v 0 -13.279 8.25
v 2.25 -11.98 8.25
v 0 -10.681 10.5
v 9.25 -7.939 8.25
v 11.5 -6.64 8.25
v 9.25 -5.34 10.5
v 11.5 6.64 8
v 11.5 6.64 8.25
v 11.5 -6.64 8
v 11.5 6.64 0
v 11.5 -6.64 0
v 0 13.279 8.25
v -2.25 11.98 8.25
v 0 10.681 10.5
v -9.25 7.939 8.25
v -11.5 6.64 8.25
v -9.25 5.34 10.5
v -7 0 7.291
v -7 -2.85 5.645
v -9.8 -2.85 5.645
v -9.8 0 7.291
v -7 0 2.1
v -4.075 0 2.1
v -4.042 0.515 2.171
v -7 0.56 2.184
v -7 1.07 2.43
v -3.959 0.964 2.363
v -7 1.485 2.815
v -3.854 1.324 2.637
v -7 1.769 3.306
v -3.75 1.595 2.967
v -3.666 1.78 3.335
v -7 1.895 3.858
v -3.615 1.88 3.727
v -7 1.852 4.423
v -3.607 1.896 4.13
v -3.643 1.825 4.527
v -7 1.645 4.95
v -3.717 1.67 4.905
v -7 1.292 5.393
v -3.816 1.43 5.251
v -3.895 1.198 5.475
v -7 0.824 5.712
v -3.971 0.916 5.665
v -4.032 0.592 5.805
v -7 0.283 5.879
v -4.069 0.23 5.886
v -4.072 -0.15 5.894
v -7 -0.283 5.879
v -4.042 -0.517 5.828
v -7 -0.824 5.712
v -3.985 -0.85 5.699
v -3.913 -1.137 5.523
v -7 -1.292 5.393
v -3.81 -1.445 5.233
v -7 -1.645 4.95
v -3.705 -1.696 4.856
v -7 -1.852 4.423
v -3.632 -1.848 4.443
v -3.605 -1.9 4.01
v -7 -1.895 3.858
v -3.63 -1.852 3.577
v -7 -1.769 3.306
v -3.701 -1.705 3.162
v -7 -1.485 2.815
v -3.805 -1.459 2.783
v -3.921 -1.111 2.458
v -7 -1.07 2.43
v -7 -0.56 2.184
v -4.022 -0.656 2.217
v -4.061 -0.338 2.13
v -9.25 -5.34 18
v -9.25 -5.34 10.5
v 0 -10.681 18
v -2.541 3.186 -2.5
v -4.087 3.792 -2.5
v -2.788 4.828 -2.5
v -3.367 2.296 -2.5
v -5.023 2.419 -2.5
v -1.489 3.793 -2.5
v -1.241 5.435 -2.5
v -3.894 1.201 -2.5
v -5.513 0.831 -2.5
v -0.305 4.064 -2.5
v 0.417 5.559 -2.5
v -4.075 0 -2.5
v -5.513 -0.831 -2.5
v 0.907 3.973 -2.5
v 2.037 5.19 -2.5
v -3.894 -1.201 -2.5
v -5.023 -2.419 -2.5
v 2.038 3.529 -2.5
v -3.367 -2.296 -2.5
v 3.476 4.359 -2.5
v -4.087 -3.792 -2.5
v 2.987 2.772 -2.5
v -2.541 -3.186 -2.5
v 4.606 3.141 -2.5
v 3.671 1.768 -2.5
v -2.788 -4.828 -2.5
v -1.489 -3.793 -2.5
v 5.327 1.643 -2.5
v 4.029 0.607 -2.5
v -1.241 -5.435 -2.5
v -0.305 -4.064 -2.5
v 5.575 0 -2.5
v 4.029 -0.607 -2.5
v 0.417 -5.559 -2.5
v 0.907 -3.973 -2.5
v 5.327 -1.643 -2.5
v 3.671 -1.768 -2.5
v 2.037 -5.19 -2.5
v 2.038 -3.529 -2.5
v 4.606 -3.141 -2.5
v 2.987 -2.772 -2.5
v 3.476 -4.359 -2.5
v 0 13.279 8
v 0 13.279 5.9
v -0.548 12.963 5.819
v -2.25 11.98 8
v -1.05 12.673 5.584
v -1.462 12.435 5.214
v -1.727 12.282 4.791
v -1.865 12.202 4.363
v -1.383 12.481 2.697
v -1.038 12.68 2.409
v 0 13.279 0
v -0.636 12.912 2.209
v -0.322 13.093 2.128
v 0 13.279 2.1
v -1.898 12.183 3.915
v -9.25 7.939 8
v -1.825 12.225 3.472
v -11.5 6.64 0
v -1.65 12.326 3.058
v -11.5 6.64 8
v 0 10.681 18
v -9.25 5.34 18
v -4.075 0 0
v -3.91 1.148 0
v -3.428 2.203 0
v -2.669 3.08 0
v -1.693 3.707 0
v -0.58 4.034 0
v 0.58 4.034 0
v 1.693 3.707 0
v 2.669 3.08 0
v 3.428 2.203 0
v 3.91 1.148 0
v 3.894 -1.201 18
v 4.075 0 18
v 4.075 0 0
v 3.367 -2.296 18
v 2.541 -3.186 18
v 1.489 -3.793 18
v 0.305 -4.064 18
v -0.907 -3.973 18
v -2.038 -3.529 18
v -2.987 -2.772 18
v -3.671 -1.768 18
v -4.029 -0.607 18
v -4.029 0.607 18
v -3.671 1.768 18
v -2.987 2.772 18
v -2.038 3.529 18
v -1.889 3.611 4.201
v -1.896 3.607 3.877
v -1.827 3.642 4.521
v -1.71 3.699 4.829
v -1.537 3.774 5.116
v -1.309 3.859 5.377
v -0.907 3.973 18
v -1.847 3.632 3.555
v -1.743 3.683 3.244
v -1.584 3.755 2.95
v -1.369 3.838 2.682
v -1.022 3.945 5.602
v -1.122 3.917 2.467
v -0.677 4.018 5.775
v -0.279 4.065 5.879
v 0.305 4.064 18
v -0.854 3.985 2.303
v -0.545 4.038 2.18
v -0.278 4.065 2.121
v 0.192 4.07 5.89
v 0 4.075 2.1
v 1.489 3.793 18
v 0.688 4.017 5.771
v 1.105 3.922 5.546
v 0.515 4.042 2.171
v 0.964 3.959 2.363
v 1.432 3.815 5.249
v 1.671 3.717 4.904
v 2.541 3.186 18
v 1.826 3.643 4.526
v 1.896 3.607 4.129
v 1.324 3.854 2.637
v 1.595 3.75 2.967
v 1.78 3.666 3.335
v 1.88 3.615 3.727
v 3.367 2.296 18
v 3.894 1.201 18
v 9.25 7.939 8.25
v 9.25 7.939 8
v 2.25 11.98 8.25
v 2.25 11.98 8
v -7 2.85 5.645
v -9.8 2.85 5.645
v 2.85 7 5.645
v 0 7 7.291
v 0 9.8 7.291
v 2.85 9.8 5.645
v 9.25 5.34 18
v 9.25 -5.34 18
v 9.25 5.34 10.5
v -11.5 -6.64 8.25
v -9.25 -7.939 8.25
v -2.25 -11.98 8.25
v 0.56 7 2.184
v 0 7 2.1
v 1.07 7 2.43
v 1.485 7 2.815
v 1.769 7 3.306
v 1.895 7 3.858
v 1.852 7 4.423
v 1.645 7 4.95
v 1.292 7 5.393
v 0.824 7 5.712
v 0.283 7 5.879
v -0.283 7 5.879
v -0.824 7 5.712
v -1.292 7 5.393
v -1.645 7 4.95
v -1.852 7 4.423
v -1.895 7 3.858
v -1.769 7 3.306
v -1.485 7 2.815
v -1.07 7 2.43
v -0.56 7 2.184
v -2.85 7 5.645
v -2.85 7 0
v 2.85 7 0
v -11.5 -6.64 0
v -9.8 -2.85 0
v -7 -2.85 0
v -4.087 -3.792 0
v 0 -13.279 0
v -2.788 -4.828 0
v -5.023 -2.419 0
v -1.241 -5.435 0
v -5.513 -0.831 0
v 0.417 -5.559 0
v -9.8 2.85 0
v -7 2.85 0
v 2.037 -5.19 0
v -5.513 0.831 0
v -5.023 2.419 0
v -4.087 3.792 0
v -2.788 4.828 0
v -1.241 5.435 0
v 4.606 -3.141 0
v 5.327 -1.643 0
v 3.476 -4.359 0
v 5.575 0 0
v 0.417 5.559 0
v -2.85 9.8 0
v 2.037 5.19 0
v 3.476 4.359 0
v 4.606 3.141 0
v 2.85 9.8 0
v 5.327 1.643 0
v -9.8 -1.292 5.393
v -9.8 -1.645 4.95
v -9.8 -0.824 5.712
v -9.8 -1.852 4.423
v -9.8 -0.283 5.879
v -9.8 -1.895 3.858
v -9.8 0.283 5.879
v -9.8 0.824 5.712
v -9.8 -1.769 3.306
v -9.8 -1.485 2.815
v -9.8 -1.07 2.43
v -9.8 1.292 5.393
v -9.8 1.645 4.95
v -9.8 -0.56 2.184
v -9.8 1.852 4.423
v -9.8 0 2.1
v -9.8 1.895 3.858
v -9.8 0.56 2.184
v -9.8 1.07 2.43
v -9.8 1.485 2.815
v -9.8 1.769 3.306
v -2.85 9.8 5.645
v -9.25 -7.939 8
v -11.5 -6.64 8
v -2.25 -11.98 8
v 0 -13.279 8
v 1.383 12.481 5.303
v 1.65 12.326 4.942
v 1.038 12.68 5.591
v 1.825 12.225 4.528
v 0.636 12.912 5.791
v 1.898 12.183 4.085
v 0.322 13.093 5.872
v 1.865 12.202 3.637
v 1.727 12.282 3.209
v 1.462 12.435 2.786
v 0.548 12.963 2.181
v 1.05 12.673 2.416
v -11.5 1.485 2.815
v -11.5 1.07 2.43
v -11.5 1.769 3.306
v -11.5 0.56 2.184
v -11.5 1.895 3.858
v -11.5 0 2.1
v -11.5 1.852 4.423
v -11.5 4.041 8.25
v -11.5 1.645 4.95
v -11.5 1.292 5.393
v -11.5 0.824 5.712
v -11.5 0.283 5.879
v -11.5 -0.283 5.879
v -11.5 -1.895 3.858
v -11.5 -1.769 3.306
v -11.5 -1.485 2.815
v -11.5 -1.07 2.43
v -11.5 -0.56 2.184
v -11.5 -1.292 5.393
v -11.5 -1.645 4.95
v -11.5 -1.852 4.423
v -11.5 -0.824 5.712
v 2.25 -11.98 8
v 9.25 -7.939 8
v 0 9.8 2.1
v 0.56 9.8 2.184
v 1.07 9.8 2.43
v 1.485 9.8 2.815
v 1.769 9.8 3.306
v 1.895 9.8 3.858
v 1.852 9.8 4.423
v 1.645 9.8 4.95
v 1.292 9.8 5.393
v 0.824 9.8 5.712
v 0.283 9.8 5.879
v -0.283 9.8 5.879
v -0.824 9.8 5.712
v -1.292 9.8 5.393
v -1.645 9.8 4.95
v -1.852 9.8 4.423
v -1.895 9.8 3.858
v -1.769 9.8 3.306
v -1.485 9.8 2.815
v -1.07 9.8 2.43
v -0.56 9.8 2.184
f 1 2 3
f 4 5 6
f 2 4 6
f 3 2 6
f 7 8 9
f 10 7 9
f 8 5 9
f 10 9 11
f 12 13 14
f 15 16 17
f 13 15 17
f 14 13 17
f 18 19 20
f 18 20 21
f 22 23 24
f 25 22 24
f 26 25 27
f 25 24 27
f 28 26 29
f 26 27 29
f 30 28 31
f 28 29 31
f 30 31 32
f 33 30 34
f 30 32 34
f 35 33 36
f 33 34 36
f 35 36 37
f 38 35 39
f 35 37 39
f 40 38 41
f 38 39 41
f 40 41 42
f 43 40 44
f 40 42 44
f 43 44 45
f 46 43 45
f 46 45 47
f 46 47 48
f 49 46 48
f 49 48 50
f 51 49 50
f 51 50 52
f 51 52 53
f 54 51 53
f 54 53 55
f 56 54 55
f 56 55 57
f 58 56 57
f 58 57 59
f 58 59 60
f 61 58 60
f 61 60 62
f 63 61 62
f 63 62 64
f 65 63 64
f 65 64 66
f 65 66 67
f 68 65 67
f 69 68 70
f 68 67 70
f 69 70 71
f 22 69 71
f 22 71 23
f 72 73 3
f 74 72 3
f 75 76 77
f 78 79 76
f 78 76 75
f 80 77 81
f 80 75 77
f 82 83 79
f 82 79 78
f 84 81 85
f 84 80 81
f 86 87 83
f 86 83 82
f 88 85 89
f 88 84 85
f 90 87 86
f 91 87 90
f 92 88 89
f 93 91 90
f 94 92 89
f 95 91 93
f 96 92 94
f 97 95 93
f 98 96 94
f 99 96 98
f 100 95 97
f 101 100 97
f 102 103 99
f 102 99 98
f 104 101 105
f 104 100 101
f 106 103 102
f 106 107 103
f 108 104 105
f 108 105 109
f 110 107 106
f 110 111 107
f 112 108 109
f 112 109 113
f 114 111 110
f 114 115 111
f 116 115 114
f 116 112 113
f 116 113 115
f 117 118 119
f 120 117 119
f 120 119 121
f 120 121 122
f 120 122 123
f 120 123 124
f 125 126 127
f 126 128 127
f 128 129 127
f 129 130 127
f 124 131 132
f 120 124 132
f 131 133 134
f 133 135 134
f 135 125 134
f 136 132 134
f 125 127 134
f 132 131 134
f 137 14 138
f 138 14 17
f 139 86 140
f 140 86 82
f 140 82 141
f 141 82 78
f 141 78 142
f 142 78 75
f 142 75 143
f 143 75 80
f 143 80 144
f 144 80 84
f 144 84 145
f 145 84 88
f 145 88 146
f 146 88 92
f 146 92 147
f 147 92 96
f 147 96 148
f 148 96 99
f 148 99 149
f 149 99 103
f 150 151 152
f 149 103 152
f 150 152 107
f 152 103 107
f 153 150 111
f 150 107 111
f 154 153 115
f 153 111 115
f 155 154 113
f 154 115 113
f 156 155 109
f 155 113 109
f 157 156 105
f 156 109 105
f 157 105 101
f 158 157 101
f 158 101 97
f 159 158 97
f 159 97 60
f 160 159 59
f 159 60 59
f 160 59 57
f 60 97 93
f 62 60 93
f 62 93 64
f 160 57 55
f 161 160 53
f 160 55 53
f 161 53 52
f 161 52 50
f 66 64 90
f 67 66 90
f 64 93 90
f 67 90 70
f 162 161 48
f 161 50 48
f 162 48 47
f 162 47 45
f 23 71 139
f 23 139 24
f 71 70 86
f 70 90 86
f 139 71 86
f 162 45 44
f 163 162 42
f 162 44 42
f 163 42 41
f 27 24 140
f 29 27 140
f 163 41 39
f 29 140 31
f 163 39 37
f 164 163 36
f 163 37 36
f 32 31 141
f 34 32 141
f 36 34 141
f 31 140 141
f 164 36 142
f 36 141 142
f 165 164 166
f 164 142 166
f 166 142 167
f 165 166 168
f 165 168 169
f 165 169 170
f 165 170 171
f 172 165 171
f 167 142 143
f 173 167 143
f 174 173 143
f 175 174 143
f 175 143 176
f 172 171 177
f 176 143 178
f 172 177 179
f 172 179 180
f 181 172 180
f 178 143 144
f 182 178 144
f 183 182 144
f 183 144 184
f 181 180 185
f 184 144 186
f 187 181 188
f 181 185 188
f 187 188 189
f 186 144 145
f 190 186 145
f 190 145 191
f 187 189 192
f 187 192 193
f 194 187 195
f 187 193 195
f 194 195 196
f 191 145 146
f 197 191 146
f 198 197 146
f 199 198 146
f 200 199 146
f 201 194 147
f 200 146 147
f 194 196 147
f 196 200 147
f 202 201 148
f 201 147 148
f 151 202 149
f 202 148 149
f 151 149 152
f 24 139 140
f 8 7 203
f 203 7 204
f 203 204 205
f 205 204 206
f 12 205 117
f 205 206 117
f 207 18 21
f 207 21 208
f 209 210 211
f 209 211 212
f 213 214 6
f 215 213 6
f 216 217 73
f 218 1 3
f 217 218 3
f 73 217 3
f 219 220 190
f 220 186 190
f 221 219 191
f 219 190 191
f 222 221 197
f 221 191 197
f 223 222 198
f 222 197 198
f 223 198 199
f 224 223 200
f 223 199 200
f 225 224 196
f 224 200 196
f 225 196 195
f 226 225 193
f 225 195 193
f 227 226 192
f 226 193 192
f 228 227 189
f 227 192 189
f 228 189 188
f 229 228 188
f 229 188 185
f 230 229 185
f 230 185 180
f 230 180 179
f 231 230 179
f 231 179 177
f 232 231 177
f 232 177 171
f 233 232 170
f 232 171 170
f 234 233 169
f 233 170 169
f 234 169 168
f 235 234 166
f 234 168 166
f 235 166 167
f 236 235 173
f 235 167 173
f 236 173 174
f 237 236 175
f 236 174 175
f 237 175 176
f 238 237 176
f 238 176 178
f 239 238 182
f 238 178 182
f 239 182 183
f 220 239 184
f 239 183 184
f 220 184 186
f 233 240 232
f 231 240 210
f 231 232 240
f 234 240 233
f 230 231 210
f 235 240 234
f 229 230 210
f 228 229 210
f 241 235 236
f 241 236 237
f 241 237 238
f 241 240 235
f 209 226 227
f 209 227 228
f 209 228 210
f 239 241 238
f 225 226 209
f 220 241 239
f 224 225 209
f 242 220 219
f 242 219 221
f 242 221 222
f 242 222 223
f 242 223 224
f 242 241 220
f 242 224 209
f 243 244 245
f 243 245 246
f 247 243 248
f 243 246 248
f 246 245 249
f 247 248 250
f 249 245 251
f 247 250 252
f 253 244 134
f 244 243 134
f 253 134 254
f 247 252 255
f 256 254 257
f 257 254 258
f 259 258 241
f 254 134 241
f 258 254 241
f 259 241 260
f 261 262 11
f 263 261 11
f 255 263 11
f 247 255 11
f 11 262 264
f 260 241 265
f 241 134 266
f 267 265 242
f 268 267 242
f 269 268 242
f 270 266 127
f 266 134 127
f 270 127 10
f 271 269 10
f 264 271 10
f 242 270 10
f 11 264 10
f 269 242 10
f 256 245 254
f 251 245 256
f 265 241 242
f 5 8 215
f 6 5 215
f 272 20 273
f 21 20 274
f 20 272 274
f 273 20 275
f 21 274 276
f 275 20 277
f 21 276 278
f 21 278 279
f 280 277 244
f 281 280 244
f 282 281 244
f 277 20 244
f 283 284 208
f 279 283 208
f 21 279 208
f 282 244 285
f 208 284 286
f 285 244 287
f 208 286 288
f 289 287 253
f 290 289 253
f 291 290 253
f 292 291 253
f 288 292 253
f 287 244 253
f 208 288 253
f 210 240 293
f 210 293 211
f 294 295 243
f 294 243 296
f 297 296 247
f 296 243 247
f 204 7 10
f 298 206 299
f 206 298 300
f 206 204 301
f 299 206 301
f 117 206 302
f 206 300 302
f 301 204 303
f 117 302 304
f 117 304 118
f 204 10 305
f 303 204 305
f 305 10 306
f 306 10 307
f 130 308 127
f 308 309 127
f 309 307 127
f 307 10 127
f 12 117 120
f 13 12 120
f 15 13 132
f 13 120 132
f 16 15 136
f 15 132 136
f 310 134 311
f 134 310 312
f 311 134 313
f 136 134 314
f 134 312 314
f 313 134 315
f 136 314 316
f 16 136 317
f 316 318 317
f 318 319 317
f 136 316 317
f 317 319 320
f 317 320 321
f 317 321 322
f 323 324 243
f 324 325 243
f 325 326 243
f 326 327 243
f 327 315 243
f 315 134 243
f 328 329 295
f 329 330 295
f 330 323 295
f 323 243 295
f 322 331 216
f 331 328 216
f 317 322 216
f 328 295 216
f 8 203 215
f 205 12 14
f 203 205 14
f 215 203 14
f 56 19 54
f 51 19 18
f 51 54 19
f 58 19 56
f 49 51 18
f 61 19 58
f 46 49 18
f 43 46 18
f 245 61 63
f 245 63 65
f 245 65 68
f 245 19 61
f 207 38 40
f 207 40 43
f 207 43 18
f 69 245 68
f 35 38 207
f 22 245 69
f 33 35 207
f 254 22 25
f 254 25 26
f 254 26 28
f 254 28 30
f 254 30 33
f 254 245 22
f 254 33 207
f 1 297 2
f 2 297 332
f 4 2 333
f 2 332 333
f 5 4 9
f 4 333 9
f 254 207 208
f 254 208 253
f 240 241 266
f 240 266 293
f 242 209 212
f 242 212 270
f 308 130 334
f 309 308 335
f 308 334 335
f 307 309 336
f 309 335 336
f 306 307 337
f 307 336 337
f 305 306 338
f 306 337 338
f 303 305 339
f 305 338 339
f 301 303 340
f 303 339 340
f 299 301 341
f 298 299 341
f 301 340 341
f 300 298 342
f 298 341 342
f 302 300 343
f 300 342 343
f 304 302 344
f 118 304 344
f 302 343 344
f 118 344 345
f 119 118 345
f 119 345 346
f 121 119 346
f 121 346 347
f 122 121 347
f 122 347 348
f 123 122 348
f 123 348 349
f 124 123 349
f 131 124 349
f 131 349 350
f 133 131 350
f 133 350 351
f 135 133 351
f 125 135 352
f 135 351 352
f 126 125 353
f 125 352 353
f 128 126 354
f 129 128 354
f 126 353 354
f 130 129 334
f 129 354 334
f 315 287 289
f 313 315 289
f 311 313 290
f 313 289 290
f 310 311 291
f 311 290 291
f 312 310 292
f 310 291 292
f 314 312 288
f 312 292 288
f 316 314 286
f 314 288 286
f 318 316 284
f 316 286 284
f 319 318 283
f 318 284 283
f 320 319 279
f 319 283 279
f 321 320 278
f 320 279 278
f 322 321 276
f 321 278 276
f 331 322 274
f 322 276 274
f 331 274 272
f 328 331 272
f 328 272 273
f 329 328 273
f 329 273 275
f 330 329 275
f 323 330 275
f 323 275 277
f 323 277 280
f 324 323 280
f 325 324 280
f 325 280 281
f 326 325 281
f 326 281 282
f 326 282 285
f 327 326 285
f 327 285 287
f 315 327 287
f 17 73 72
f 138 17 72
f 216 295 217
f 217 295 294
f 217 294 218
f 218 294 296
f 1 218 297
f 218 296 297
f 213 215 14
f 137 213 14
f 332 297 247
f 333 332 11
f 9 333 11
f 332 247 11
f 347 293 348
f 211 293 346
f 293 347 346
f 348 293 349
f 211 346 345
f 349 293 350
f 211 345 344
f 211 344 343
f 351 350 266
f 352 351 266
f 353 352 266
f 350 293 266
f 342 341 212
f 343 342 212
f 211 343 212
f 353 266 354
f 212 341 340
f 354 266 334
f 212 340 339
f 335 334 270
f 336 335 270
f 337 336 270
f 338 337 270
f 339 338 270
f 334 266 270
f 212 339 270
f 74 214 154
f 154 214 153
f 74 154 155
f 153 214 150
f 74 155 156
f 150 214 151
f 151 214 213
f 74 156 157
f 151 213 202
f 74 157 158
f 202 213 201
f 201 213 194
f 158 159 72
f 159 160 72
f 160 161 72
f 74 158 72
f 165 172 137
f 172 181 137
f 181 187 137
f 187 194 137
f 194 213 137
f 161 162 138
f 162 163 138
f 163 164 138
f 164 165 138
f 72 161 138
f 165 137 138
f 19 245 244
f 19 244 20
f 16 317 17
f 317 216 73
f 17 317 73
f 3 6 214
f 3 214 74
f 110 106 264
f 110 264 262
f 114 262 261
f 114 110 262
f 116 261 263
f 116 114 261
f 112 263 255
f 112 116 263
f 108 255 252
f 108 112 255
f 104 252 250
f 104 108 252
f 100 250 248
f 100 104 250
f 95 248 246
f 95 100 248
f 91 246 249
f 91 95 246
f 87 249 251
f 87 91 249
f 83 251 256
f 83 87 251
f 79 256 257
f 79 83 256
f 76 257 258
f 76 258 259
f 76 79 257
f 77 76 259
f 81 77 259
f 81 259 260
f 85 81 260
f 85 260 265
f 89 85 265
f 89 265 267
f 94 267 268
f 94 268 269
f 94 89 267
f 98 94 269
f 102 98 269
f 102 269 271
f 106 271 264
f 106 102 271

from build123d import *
from build123d.topology import SkipClean

# Parameters (mm, degrees)
SKETCH2_R           = 4.075
BOSS_EXTRUDE2_DEPTH = 8
SKETCH18_R          = 4.075
BOSS_EXTRUDE4_DEPTH = 10
SKETCH5_R           = 1.9
CUT_EXTRUDE8_DEPTH  = 26.151209381
CUT_EXTRUDE7_DEPTH  = 2.8
CIRPATTERN1_COUNT   = 2
CIRPATTERN1_ANGLE   = 90
BOSS_EXTRUDE3_START = 2.5
SKETCH17_R          = 5.575
SKETCH17_R_2        = 4.075
BOSS_EXTRUDE3_DEPTH = 2.5
CHAMFER4_SIZE       = 2.5


with BuildPart() as part:
    # Sketch2 → Boss-Extrude2 (new body)
    with BuildSketch(Plane.XY):
        Polygon((11.5, -6.639528096), (11.5, 6.639528096), (0, 13.279056191), (-11.5, 6.639528096), (-11.5, -6.639528096), (0, -13.279056191), align=None)
        Circle(SKETCH2_R, mode=Mode.SUBTRACT)
    extrude(amount=BOSS_EXTRUDE2_DEPTH)

    # Sketch18 → Boss-Extrude4 (add)
    with BuildSketch(Plane(origin=(0, 0, 8), x_dir=(-1, 0, 0), z_dir=(0, 0, -1))):
        Polygon((-9.25, -5.34048999), (0, -10.68097998), (9.25, -5.34048999), (9.25, 5.34048999), (0, 10.68097998), (-9.25, 5.34048999), align=None)
        with Locations(Location((0, 0, 0), (0, 0, 180))):
            Circle(SKETCH18_R, mode=Mode.SUBTRACT)
    extrude(amount=-BOSS_EXTRUDE4_DEPTH)

    # Sketch5 → Cut-Extrude8 (cut, through all)
    with BuildSketch(Plane(origin=(0, 0, 0), x_dir=(0, 0, -1), z_dir=(0, -1, 0))):
        with Locations((-4, 0)):
            Circle(SKETCH5_R)
    cut_extrude8 = extrude(amount=-CUT_EXTRUDE8_DEPTH, mode=Mode.SUBTRACT)

    # Sketch16 → Cut-Extrude7 (cut)
    with BuildSketch(Plane(origin=(0, 7, 0), x_dir=(1, 0, 0), z_dir=(0, 1, 0))):
        Polygon((0, -7.290896534), (2.85, -5.645448267), (2.85, -2.354551733), (2.85, 0), (-2.85, 0), (-2.85, -2.354551733), (-2.85, -5.645448267), align=None)
    cut_extrude7 = extrude(amount=CUT_EXTRUDE7_DEPTH, mode=Mode.SUBTRACT)

    # CirPattern1: Cut-Extrude8, Cut-Extrude7 ×2 about axis
    cirpattern1_axis = Axis((0, 0, 0), (0, 0, 1))
    add([cut_extrude8.rotate(cirpattern1_axis, i * CIRPATTERN1_ANGLE / (CIRPATTERN1_COUNT - 1)) for i in range(1, CIRPATTERN1_COUNT)], mode=Mode.SUBTRACT)
    add([cut_extrude7.rotate(cirpattern1_axis, i * CIRPATTERN1_ANGLE / (CIRPATTERN1_COUNT - 1)) for i in range(1, CIRPATTERN1_COUNT)], mode=Mode.SUBTRACT)

    # Sketch17 → Boss-Extrude3 (add)
    with SkipClean():  # the faces are left unmerged after this step: merging them gives an invalid solid
        with BuildSketch(Plane(origin=(0, 0, 0), x_dir=(-1, 0, 0), z_dir=(0, 0, -1)).offset(BOSS_EXTRUDE3_START)):
            with Locations(Location((0, 0, 0), (0, 0, 180))):
                Circle(SKETCH17_R)
            Circle(SKETCH17_R_2, mode=Mode.SUBTRACT)
        extrude(amount=-BOSS_EXTRUDE3_DEPTH)

    # Chamfer4
    # the kernel refuses this chamfer: 2.5 mm, written as the material it adds along each edge
    with BuildSketch(Plane(origin=(14.817856995, -2.125886255, 8), x_dir=(0.49981095845564855, -0.8656979742248802, -0.0274958766105863), z_dir=(-0.8660254037844386, -0.5000000000000002, 0))) as chamfer4_piece_1_section:
        Polygon((CHAMFER4_SIZE * 0.999621916911, CHAMFER4_SIZE * 0.0274958766106), (-CHAMFER4_SIZE * 0.0274958766106, CHAMFER4_SIZE * 0.999621916911), (0, 0), align=None)
    chamfer4_piece_1 = extrude(amount=23.53939492, mode=Mode.PRIVATE)
    chamfer4_piece_1 = split(chamfer4_piece_1, bisect_by=Plane(origin=(5.75, -9.959292144, 8.862467682), z_dir=(-0.5000000000000001, 0.8660254037844386, 0)), keep=Keep.TOP, mode=Mode.PRIVATE)
    chamfer4_piece_1 = split(chamfer4_piece_1, bisect_by=Plane(origin=(9.25, -8.662876539, 8.862467682), z_dir=(-1, 0, 0)), keep=Keep.TOP, mode=Mode.PRIVATE)
    chamfer4_piece_1 = split(chamfer4_piece_1, bisect_by=Plane(origin=(2.877271152, -12.342173254, 8.862467682), z_dir=(0.5000000000000001, 0.8660254037844387, 0)), keep=Keep.TOP, mode=Mode.PRIVATE)
    add(chamfer4_piece_1)
    with BuildSketch(Plane(origin=(5.567856995, -13.895583715, 8), x_dir=(-0.4998109584556484, -0.8656979742248803, -0.027495876610586313), z_dir=(-0.8660254037844387, 0.5000000000000001, 0))) as chamfer4_piece_2_section:
        Polygon((CHAMFER4_SIZE * 0.999621916911, CHAMFER4_SIZE * 0.0274958766106), (-CHAMFER4_SIZE * 0.0274958766106, CHAMFER4_SIZE * 0.999621916911), (0, 0), align=None)
    chamfer4_piece_2 = extrude(amount=23.53939492, mode=Mode.PRIVATE)
    chamfer4_piece_2 = split(chamfer4_piece_2, bisect_by=Plane(origin=(-5.75, -9.959292144, 8.862467682), z_dir=(0.5000000000000002, 0.8660254037844386, 0)), keep=Keep.TOP, mode=Mode.PRIVATE)
    chamfer4_piece_2 = split(chamfer4_piece_2, bisect_by=Plane(origin=(-9.25, -8.662876539, 8.862467682), z_dir=(1, 0, 0)), keep=Keep.TOP, mode=Mode.PRIVATE)
    chamfer4_piece_2 = split(chamfer4_piece_2, bisect_by=Plane(origin=(-2.877271152, -12.342173254, 8.862467682), z_dir=(-0.5000000000000002, 0.8660254037844386, 0)), keep=Keep.TOP, mode=Mode.PRIVATE)
    add(chamfer4_piece_2)
    with BuildSketch(Plane(origin=(-9.25, -11.76969746, 8), x_dir=(-0.9996219169112968, 0, -0.027495876610586317), z_dir=(0, 1, 0))) as chamfer4_piece_3_section:
        Polygon((CHAMFER4_SIZE * 0.999621916911, CHAMFER4_SIZE * 0.0274958766106), (-CHAMFER4_SIZE * 0.0274958766106, CHAMFER4_SIZE * 0.999621916911), (0, 0), align=None)
    chamfer4_piece_3 = extrude(amount=23.53939492, mode=Mode.PRIVATE)
    chamfer4_piece_3 = split(chamfer4_piece_3, bisect_by=Plane(origin=(-11.5, 0, 8.862467682), z_dir=(1, 0, 0)), keep=Keep.TOP, mode=Mode.PRIVATE)
    chamfer4_piece_3 = split(chamfer4_piece_3, bisect_by=Plane(origin=(-12.127271152, 3.679296716, 8.862467682), z_dir=(0.5, -0.8660254037844387, 0)), keep=Keep.TOP, mode=Mode.PRIVATE)
    chamfer4_piece_3 = split(chamfer4_piece_3, bisect_by=Plane(origin=(-12.127271152, -3.679296716, 8.862467682), z_dir=(0.5000000000000001, 0.8660254037844387, 0)), keep=Keep.TOP, mode=Mode.PRIVATE)
    add(chamfer4_piece_3)
    with BuildSketch(Plane(origin=(-14.817856995, 2.125886255, 8), x_dir=(-0.49981095845564827, 0.8656979742248804, -0.027495876610586303), z_dir=(0.8660254037844387, 0.5, 0))) as chamfer4_piece_4_section:
        Polygon((CHAMFER4_SIZE * 0.999621916911, CHAMFER4_SIZE * 0.0274958766106), (-CHAMFER4_SIZE * 0.0274958766106, CHAMFER4_SIZE * 0.999621916911), (0, 0), align=None)
    chamfer4_piece_4 = extrude(amount=23.53939492, mode=Mode.PRIVATE)
    chamfer4_piece_4 = split(chamfer4_piece_4, bisect_by=Plane(origin=(-5.75, 9.959292144, 8.862467682), z_dir=(0.49999999999999983, -0.8660254037844388, 0)), keep=Keep.TOP, mode=Mode.PRIVATE)
    chamfer4_piece_4 = split(chamfer4_piece_4, bisect_by=Plane(origin=(-2.877271152, 12.342173254, 8.862467682), z_dir=(-0.5, -0.8660254037844387, 0)), keep=Keep.TOP, mode=Mode.PRIVATE)
    chamfer4_piece_4 = split(chamfer4_piece_4, bisect_by=Plane(origin=(-9.25, 8.662876539, 8.862467682), z_dir=(1, 0, 0)), keep=Keep.TOP, mode=Mode.PRIVATE)
    add(chamfer4_piece_4)
    with BuildSketch(Plane(origin=(-5.567856995, 13.895583715, 8), x_dir=(0.4998109584556484, 0.8656979742248804, -0.027495876610586317), z_dir=(0.8660254037844387, -0.5, 0))) as chamfer4_piece_5_section:
        Polygon((CHAMFER4_SIZE * 0.999621916911, CHAMFER4_SIZE * 0.0274958766106), (-CHAMFER4_SIZE * 0.0274958766106, CHAMFER4_SIZE * 0.999621916911), (0, 0), align=None)
    chamfer4_piece_5 = extrude(amount=23.53939492, mode=Mode.PRIVATE)
    chamfer4_piece_5 = split(chamfer4_piece_5, bisect_by=Plane(origin=(5.75, 9.959292144, 8.862467682), z_dir=(-0.49999999999999983, -0.8660254037844388, 0)), keep=Keep.TOP, mode=Mode.PRIVATE)
    chamfer4_piece_5 = split(chamfer4_piece_5, bisect_by=Plane(origin=(9.25, 8.662876539, 8.862467682), z_dir=(-1, 0, 0)), keep=Keep.TOP, mode=Mode.PRIVATE)
    chamfer4_piece_5 = split(chamfer4_piece_5, bisect_by=Plane(origin=(2.877271152, 12.342173254, 8.862467682), z_dir=(0.5, -0.8660254037844387, 0)), keep=Keep.TOP, mode=Mode.PRIVATE)
    add(chamfer4_piece_5)
    with BuildSketch(Plane(origin=(9.25, 11.76969746, 8), x_dir=(0.9996219169112968, 0, -0.027495876610586317), z_dir=(0, -1, 0))) as chamfer4_piece_6_section:
        Polygon((CHAMFER4_SIZE * 0.999621916911, CHAMFER4_SIZE * 0.0274958766106), (-CHAMFER4_SIZE * 0.0274958766106, CHAMFER4_SIZE * 0.999621916911), (0, 0), align=None)
    chamfer4_piece_6 = extrude(amount=23.53939492, mode=Mode.PRIVATE)
    chamfer4_piece_6 = split(chamfer4_piece_6, bisect_by=Plane(origin=(11.5, 0, 8.862467682), z_dir=(-1, 0, 0)), keep=Keep.TOP, mode=Mode.PRIVATE)
    chamfer4_piece_6 = split(chamfer4_piece_6, bisect_by=Plane(origin=(12.127271152, 3.679296716, 8.862467682), z_dir=(-0.5, -0.8660254037844387, 0)), keep=Keep.TOP, mode=Mode.PRIVATE)
    chamfer4_piece_6 = split(chamfer4_piece_6, bisect_by=Plane(origin=(12.127271152, -3.679296716, 8.862467682), z_dir=(-0.5000000000000002, 0.8660254037844386, 0)), keep=Keep.TOP, mode=Mode.PRIVATE)
    add(chamfer4_piece_6)
    with BuildSketch(Plane(origin=(9.25, 11.76969746, 8), x_dir=(0.9996219169112968, 0, -0.027495876610586317), z_dir=(0, -1, 0))) as chamfer4_piece_7a_section:
        Polygon((CHAMFER4_SIZE * 0.999621916911, CHAMFER4_SIZE * 0.0274958766106), (-CHAMFER4_SIZE * 0.0274958766106, CHAMFER4_SIZE * 0.999621916911), (0, 0), align=None)
    chamfer4_piece_7a = extrude(amount=23.53939492, mode=Mode.PRIVATE)
    chamfer4_piece_7a = split(chamfer4_piece_7a, bisect_by=Plane(origin=(11.5, -6.180288519, 8.839751868), z_dir=(-1, 0, 0)), keep=Keep.TOP, mode=Mode.PRIVATE)
    chamfer4_piece_7a = split(chamfer4_piece_7a, bisect_by=Plane(origin=(10.60792628, -7.154567098, 8.839751868), z_dir=(-0.5000000000000001, 0.8660254037844386, 0)), keep=Keep.TOP, mode=Mode.PRIVATE)
    chamfer4_piece_7a = split(chamfer4_piece_7a, bisect_by=Plane(origin=(9.48292628, -5.20600994, 8.839751868), z_dir=(0.5000000000000002, -0.8660254037844386, 0)), keep=Keep.TOP, mode=Mode.PRIVATE)
    with BuildSketch(Plane(origin=(14.817856995, -2.125886255, 8), x_dir=(0.49981095845564855, -0.8656979742248802, -0.0274958766105863), z_dir=(-0.8660254037844386, -0.5000000000000002, 0))) as chamfer4_piece_7b_section:
        Polygon((CHAMFER4_SIZE * 0.999621916911, CHAMFER4_SIZE * 0.0274958766106), (-CHAMFER4_SIZE * 0.0274958766106, CHAMFER4_SIZE * 0.999621916911), (0, 0), align=None)
    chamfer4_piece_7b = extrude(amount=23.53939492, mode=Mode.PRIVATE)
    chamfer4_piece_7b = split(chamfer4_piece_7b, bisect_by=Plane(origin=(11.5, -5.609450091, 8.839751868), z_dir=(-1, 0, 0)), keep=Keep.TOP, mode=Mode.PRIVATE)
    chamfer4_piece_7b = split(chamfer4_piece_7b, bisect_by=Plane(origin=(11.10228686, -6.869147884, 8.839751868), z_dir=(-0.5000000000000001, 0.8660254037844386, 0)), keep=Keep.TOP, mode=Mode.PRIVATE)
    chamfer4_piece_7b = split(chamfer4_piece_7b, bisect_by=Plane(origin=(9.25, -5.609450091, 8.839751868), z_dir=(1, 0, 0)), keep=Keep.TOP, mode=Mode.PRIVATE)
    chamfer4_piece_7 = chamfer4_piece_7a & chamfer4_piece_7b
    add(chamfer4_piece_7)
    with BuildSketch(Plane(origin=(5.567856995, -13.895583715, 8), x_dir=(-0.4998109584556484, -0.8656979742248803, -0.027495876610586313), z_dir=(-0.8660254037844387, 0.5000000000000001, 0))) as chamfer4_piece_8a_section:
        Polygon((CHAMFER4_SIZE * 0.999621916911, CHAMFER4_SIZE * 0.0274958766106), (-CHAMFER4_SIZE * 0.0274958766106, CHAMFER4_SIZE * 0.999621916911), (0, 0), align=None)
    chamfer4_piece_8a = extrude(amount=23.53939492, mode=Mode.PRIVATE)
    chamfer4_piece_8a = split(chamfer4_piece_8a, bisect_by=Plane(origin=(0.89207372, -12.764017189, 8.839751868), z_dir=(-0.5000000000000001, 0.8660254037844386, 0)), keep=Keep.TOP, mode=Mode.PRIVATE)
    chamfer4_piece_8a = split(chamfer4_piece_8a, bisect_by=Plane(origin=(-0.39771314, -13.049436403, 8.839751868), z_dir=(0.5000000000000002, 0.8660254037844386, 0)), keep=Keep.TOP, mode=Mode.PRIVATE)
    chamfer4_piece_8a = split(chamfer4_piece_8a, bisect_by=Plane(origin=(-0.23292628, -10.81546003, 8.839751868), z_dir=(0.5000000000000002, -0.8660254037844386, 0)), keep=Keep.TOP, mode=Mode.PRIVATE)
    with BuildSketch(Plane(origin=(14.817856995, -2.125886255, 8), x_dir=(0.49981095845564855, -0.8656979742248802, -0.0274958766105863), z_dir=(-0.8660254037844386, -0.5000000000000002, 0))) as chamfer4_piece_8b_section:
        Polygon((CHAMFER4_SIZE * 0.999621916911, CHAMFER4_SIZE * 0.0274958766106), (-CHAMFER4_SIZE * 0.0274958766106, CHAMFER4_SIZE * 0.999621916911), (0, 0), align=None)
    chamfer4_piece_8b = extrude(amount=23.53939492, mode=Mode.PRIVATE)
    chamfer4_piece_8b = split(chamfer4_piece_8b, bisect_by=Plane(origin=(0.39771314, -13.049436403, 8.839751868), z_dir=(-0.5000000000000001, 0.8660254037844386, 0)), keep=Keep.TOP, mode=Mode.PRIVATE)
    chamfer4_piece_8b = split(chamfer4_piece_8b, bisect_by=Plane(origin=(-0.89207372, -12.764017189, 8.839751868), z_dir=(0.5000000000000002, 0.8660254037844386, 0)), keep=Keep.TOP, mode=Mode.PRIVATE)
    chamfer4_piece_8b = split(chamfer4_piece_8b, bisect_by=Plane(origin=(0.23292628, -10.81546003, 8.839751868), z_dir=(-0.5000000000000001, -0.8660254037844387, 0)), keep=Keep.TOP, mode=Mode.PRIVATE)
    chamfer4_piece_8 = chamfer4_piece_8a & chamfer4_piece_8b
    add(chamfer4_piece_8)
    with BuildSketch(Plane(origin=(-9.25, -11.76969746, 8), x_dir=(-0.9996219169112968, 0, -0.027495876610586317), z_dir=(0, 1, 0))) as chamfer4_piece_9a_section:
        Polygon((CHAMFER4_SIZE * 0.999621916911, CHAMFER4_SIZE * 0.0274958766106), (-CHAMFER4_SIZE * 0.0274958766106, CHAMFER4_SIZE * 0.999621916911), (0, 0), align=None)
    chamfer4_piece_9a = extrude(amount=23.53939492, mode=Mode.PRIVATE)
    chamfer4_piece_9a = split(chamfer4_piece_9a, bisect_by=Plane(origin=(-10.60792628, -7.154567098, 8.839751868), z_dir=(0.5000000000000002, 0.8660254037844386, 0)), keep=Keep.TOP, mode=Mode.PRIVATE)
    chamfer4_piece_9a = split(chamfer4_piece_9a, bisect_by=Plane(origin=(-11.5, -6.180288519, 8.839751868), z_dir=(1, 0, 0)), keep=Keep.TOP, mode=Mode.PRIVATE)
    chamfer4_piece_9a = split(chamfer4_piece_9a, bisect_by=Plane(origin=(-9.48292628, -5.20600994, 8.839751868), z_dir=(-0.5000000000000001, -0.8660254037844387, 0)), keep=Keep.TOP, mode=Mode.PRIVATE)
    with BuildSketch(Plane(origin=(5.567856995, -13.895583715, 8), x_dir=(-0.4998109584556484, -0.8656979742248803, -0.027495876610586313), z_dir=(-0.8660254037844387, 0.5000000000000001, 0))) as chamfer4_piece_9b_section:
        Polygon((CHAMFER4_SIZE * 0.999621916911, CHAMFER4_SIZE * 0.0274958766106), (-CHAMFER4_SIZE * 0.0274958766106, CHAMFER4_SIZE * 0.999621916911), (0, 0), align=None)
    chamfer4_piece_9b = extrude(amount=23.53939492, mode=Mode.PRIVATE)
    chamfer4_piece_9b = split(chamfer4_piece_9b, bisect_by=Plane(origin=(-11.10228686, -6.869147884, 8.839751868), z_dir=(0.5000000000000002, 0.8660254037844386, 0)), keep=Keep.TOP, mode=Mode.PRIVATE)
    chamfer4_piece_9b = split(chamfer4_piece_9b, bisect_by=Plane(origin=(-11.5, -5.609450091, 8.839751868), z_dir=(1, 0, 0)), keep=Keep.TOP, mode=Mode.PRIVATE)
    chamfer4_piece_9b = split(chamfer4_piece_9b, bisect_by=Plane(origin=(-9.25, -5.609450091, 8.839751868), z_dir=(-1, 0, 0)), keep=Keep.TOP, mode=Mode.PRIVATE)
    chamfer4_piece_9 = chamfer4_piece_9a & chamfer4_piece_9b
    add(chamfer4_piece_9)
    with BuildSketch(Plane(origin=(-14.817856995, 2.125886255, 8), x_dir=(-0.49981095845564827, 0.8656979742248804, -0.027495876610586303), z_dir=(0.8660254037844387, 0.5, 0))) as chamfer4_piece_10a_section:
        Polygon((CHAMFER4_SIZE * 0.999621916911, CHAMFER4_SIZE * 0.0274958766106), (-CHAMFER4_SIZE * 0.0274958766106, CHAMFER4_SIZE * 0.999621916911), (0, 0), align=None)
    chamfer4_piece_10a = extrude(amount=23.53939492, mode=Mode.PRIVATE)
    chamfer4_piece_10a = split(chamfer4_piece_10a, bisect_by=Plane(origin=(-11.10228686, 6.869147884, 8.839751868), z_dir=(0.49999999999999983, -0.8660254037844388, 0)), keep=Keep.TOP, mode=Mode.PRIVATE)
    chamfer4_piece_10a = split(chamfer4_piece_10a, bisect_by=Plane(origin=(-11.5, 5.609450091, 8.839751868), z_dir=(1, 0, 0)), keep=Keep.TOP, mode=Mode.PRIVATE)
    chamfer4_piece_10a = split(chamfer4_piece_10a, bisect_by=Plane(origin=(-9.25, 5.609450091, 8.839751868), z_dir=(-1, 0, 0)), keep=Keep.TOP, mode=Mode.PRIVATE)
    with BuildSketch(Plane(origin=(-9.25, -11.76969746, 8), x_dir=(-0.9996219169112968, 0, -0.027495876610586317), z_dir=(0, 1, 0))) as chamfer4_piece_10b_section:
        Polygon((CHAMFER4_SIZE * 0.999621916911, CHAMFER4_SIZE * 0.0274958766106), (-CHAMFER4_SIZE * 0.0274958766106, CHAMFER4_SIZE * 0.999621916911), (0, 0), align=None)
    chamfer4_piece_10b = extrude(amount=23.53939492, mode=Mode.PRIVATE)
    chamfer4_piece_10b = split(chamfer4_piece_10b, bisect_by=Plane(origin=(-10.60792628, 7.154567098, 8.839751868), z_dir=(0.49999999999999983, -0.8660254037844388, 0)), keep=Keep.TOP, mode=Mode.PRIVATE)
    chamfer4_piece_10b = split(chamfer4_piece_10b, bisect_by=Plane(origin=(-11.5, 6.180288519, 8.839751868), z_dir=(1, 0, 0)), keep=Keep.TOP, mode=Mode.PRIVATE)
    chamfer4_piece_10b = split(chamfer4_piece_10b, bisect_by=Plane(origin=(-9.48292628, 5.20600994, 8.839751868), z_dir=(-0.5, 0.8660254037844387, 0)), keep=Keep.TOP, mode=Mode.PRIVATE)
    chamfer4_piece_10 = chamfer4_piece_10a & chamfer4_piece_10b
    add(chamfer4_piece_10)
    with BuildSketch(Plane(origin=(-5.567856995, 13.895583715, 8), x_dir=(0.4998109584556484, 0.8656979742248804, -0.027495876610586317), z_dir=(0.8660254037844387, -0.5, 0))) as chamfer4_piece_11a_section:
        Polygon((CHAMFER4_SIZE * 0.999621916911, CHAMFER4_SIZE * 0.0274958766106), (-CHAMFER4_SIZE * 0.0274958766106, CHAMFER4_SIZE * 0.999621916911), (0, 0), align=None)
    chamfer4_piece_11a = extrude(amount=23.53939492, mode=Mode.PRIVATE)
    chamfer4_piece_11a = split(chamfer4_piece_11a, bisect_by=Plane(origin=(0.39771314, 13.049436403, 8.839751868), z_dir=(-0.49999999999999983, -0.8660254037844388, 0)), keep=Keep.TOP, mode=Mode.PRIVATE)
    chamfer4_piece_11a = split(chamfer4_piece_11a, bisect_by=Plane(origin=(-0.89207372, 12.764017189, 8.839751868), z_dir=(0.49999999999999983, -0.8660254037844388, 0)), keep=Keep.TOP, mode=Mode.PRIVATE)
    chamfer4_piece_11a = split(chamfer4_piece_11a, bisect_by=Plane(origin=(0.23292628, 10.81546003, 8.839751868), z_dir=(-0.5, 0.8660254037844387, 0)), keep=Keep.TOP, mode=Mode.PRIVATE)
    with BuildSketch(Plane(origin=(-14.817856995, 2.125886255, 8), x_dir=(-0.49981095845564827, 0.8656979742248804, -0.027495876610586303), z_dir=(0.8660254037844387, 0.5, 0))) as chamfer4_piece_11b_section:
        Polygon((CHAMFER4_SIZE * 0.999621916911, CHAMFER4_SIZE * 0.0274958766106), (-CHAMFER4_SIZE * 0.0274958766106, CHAMFER4_SIZE * 0.999621916911), (0, 0), align=None)
    chamfer4_piece_11b = extrude(amount=23.53939492, mode=Mode.PRIVATE)
    chamfer4_piece_11b = split(chamfer4_piece_11b, bisect_by=Plane(origin=(0.89207372, 12.764017189, 8.839751868), z_dir=(-0.49999999999999983, -0.8660254037844388, 0)), keep=Keep.TOP, mode=Mode.PRIVATE)
    chamfer4_piece_11b = split(chamfer4_piece_11b, bisect_by=Plane(origin=(-0.39771314, 13.049436403, 8.839751868), z_dir=(0.49999999999999983, -0.8660254037844388, 0)), keep=Keep.TOP, mode=Mode.PRIVATE)
    chamfer4_piece_11b = split(chamfer4_piece_11b, bisect_by=Plane(origin=(-0.23292628, 10.81546003, 8.839751868), z_dir=(0.5, 0.8660254037844387, 0)), keep=Keep.TOP, mode=Mode.PRIVATE)
    chamfer4_piece_11 = chamfer4_piece_11a & chamfer4_piece_11b
    add(chamfer4_piece_11)
    with BuildSketch(Plane(origin=(9.25, 11.76969746, 8), x_dir=(0.9996219169112968, 0, -0.027495876610586317), z_dir=(0, -1, 0))) as chamfer4_piece_12a_section:
        Polygon((CHAMFER4_SIZE * 0.999621916911, CHAMFER4_SIZE * 0.0274958766106), (-CHAMFER4_SIZE * 0.0274958766106, CHAMFER4_SIZE * 0.999621916911), (0, 0), align=None)
    chamfer4_piece_12a = extrude(amount=23.53939492, mode=Mode.PRIVATE)
    chamfer4_piece_12a = split(chamfer4_piece_12a, bisect_by=Plane(origin=(11.5, 6.180288519, 8.839751868), z_dir=(-1, 0, 0)), keep=Keep.TOP, mode=Mode.PRIVATE)
    chamfer4_piece_12a = split(chamfer4_piece_12a, bisect_by=Plane(origin=(10.60792628, 7.154567098, 8.839751868), z_dir=(-0.49999999999999983, -0.8660254037844388, 0)), keep=Keep.TOP, mode=Mode.PRIVATE)
    chamfer4_piece_12a = split(chamfer4_piece_12a, bisect_by=Plane(origin=(9.48292628, 5.20600994, 8.839751868), z_dir=(0.5, 0.8660254037844387, 0)), keep=Keep.TOP, mode=Mode.PRIVATE)
    with BuildSketch(Plane(origin=(-5.567856995, 13.895583715, 8), x_dir=(0.4998109584556484, 0.8656979742248804, -0.027495876610586317), z_dir=(0.8660254037844387, -0.5, 0))) as chamfer4_piece_12b_section:
        Polygon((CHAMFER4_SIZE * 0.999621916911, CHAMFER4_SIZE * 0.0274958766106), (-CHAMFER4_SIZE * 0.0274958766106, CHAMFER4_SIZE * 0.999621916911), (0, 0), align=None)
    chamfer4_piece_12b = extrude(amount=23.53939492, mode=Mode.PRIVATE)
    chamfer4_piece_12b = split(chamfer4_piece_12b, bisect_by=Plane(origin=(11.5, 5.609450091, 8.839751868), z_dir=(-1, 0, 0)), keep=Keep.TOP, mode=Mode.PRIVATE)
    chamfer4_piece_12b = split(chamfer4_piece_12b, bisect_by=Plane(origin=(11.10228686, 6.869147884, 8.839751868), z_dir=(-0.49999999999999983, -0.8660254037844388, 0)), keep=Keep.TOP, mode=Mode.PRIVATE)
    chamfer4_piece_12b = split(chamfer4_piece_12b, bisect_by=Plane(origin=(9.25, 5.609450091, 8.839751868), z_dir=(1, 0, 0)), keep=Keep.TOP, mode=Mode.PRIVATE)
    chamfer4_piece_12 = chamfer4_piece_12a & chamfer4_piece_12b
    add(chamfer4_piece_12)


solid = part.part
